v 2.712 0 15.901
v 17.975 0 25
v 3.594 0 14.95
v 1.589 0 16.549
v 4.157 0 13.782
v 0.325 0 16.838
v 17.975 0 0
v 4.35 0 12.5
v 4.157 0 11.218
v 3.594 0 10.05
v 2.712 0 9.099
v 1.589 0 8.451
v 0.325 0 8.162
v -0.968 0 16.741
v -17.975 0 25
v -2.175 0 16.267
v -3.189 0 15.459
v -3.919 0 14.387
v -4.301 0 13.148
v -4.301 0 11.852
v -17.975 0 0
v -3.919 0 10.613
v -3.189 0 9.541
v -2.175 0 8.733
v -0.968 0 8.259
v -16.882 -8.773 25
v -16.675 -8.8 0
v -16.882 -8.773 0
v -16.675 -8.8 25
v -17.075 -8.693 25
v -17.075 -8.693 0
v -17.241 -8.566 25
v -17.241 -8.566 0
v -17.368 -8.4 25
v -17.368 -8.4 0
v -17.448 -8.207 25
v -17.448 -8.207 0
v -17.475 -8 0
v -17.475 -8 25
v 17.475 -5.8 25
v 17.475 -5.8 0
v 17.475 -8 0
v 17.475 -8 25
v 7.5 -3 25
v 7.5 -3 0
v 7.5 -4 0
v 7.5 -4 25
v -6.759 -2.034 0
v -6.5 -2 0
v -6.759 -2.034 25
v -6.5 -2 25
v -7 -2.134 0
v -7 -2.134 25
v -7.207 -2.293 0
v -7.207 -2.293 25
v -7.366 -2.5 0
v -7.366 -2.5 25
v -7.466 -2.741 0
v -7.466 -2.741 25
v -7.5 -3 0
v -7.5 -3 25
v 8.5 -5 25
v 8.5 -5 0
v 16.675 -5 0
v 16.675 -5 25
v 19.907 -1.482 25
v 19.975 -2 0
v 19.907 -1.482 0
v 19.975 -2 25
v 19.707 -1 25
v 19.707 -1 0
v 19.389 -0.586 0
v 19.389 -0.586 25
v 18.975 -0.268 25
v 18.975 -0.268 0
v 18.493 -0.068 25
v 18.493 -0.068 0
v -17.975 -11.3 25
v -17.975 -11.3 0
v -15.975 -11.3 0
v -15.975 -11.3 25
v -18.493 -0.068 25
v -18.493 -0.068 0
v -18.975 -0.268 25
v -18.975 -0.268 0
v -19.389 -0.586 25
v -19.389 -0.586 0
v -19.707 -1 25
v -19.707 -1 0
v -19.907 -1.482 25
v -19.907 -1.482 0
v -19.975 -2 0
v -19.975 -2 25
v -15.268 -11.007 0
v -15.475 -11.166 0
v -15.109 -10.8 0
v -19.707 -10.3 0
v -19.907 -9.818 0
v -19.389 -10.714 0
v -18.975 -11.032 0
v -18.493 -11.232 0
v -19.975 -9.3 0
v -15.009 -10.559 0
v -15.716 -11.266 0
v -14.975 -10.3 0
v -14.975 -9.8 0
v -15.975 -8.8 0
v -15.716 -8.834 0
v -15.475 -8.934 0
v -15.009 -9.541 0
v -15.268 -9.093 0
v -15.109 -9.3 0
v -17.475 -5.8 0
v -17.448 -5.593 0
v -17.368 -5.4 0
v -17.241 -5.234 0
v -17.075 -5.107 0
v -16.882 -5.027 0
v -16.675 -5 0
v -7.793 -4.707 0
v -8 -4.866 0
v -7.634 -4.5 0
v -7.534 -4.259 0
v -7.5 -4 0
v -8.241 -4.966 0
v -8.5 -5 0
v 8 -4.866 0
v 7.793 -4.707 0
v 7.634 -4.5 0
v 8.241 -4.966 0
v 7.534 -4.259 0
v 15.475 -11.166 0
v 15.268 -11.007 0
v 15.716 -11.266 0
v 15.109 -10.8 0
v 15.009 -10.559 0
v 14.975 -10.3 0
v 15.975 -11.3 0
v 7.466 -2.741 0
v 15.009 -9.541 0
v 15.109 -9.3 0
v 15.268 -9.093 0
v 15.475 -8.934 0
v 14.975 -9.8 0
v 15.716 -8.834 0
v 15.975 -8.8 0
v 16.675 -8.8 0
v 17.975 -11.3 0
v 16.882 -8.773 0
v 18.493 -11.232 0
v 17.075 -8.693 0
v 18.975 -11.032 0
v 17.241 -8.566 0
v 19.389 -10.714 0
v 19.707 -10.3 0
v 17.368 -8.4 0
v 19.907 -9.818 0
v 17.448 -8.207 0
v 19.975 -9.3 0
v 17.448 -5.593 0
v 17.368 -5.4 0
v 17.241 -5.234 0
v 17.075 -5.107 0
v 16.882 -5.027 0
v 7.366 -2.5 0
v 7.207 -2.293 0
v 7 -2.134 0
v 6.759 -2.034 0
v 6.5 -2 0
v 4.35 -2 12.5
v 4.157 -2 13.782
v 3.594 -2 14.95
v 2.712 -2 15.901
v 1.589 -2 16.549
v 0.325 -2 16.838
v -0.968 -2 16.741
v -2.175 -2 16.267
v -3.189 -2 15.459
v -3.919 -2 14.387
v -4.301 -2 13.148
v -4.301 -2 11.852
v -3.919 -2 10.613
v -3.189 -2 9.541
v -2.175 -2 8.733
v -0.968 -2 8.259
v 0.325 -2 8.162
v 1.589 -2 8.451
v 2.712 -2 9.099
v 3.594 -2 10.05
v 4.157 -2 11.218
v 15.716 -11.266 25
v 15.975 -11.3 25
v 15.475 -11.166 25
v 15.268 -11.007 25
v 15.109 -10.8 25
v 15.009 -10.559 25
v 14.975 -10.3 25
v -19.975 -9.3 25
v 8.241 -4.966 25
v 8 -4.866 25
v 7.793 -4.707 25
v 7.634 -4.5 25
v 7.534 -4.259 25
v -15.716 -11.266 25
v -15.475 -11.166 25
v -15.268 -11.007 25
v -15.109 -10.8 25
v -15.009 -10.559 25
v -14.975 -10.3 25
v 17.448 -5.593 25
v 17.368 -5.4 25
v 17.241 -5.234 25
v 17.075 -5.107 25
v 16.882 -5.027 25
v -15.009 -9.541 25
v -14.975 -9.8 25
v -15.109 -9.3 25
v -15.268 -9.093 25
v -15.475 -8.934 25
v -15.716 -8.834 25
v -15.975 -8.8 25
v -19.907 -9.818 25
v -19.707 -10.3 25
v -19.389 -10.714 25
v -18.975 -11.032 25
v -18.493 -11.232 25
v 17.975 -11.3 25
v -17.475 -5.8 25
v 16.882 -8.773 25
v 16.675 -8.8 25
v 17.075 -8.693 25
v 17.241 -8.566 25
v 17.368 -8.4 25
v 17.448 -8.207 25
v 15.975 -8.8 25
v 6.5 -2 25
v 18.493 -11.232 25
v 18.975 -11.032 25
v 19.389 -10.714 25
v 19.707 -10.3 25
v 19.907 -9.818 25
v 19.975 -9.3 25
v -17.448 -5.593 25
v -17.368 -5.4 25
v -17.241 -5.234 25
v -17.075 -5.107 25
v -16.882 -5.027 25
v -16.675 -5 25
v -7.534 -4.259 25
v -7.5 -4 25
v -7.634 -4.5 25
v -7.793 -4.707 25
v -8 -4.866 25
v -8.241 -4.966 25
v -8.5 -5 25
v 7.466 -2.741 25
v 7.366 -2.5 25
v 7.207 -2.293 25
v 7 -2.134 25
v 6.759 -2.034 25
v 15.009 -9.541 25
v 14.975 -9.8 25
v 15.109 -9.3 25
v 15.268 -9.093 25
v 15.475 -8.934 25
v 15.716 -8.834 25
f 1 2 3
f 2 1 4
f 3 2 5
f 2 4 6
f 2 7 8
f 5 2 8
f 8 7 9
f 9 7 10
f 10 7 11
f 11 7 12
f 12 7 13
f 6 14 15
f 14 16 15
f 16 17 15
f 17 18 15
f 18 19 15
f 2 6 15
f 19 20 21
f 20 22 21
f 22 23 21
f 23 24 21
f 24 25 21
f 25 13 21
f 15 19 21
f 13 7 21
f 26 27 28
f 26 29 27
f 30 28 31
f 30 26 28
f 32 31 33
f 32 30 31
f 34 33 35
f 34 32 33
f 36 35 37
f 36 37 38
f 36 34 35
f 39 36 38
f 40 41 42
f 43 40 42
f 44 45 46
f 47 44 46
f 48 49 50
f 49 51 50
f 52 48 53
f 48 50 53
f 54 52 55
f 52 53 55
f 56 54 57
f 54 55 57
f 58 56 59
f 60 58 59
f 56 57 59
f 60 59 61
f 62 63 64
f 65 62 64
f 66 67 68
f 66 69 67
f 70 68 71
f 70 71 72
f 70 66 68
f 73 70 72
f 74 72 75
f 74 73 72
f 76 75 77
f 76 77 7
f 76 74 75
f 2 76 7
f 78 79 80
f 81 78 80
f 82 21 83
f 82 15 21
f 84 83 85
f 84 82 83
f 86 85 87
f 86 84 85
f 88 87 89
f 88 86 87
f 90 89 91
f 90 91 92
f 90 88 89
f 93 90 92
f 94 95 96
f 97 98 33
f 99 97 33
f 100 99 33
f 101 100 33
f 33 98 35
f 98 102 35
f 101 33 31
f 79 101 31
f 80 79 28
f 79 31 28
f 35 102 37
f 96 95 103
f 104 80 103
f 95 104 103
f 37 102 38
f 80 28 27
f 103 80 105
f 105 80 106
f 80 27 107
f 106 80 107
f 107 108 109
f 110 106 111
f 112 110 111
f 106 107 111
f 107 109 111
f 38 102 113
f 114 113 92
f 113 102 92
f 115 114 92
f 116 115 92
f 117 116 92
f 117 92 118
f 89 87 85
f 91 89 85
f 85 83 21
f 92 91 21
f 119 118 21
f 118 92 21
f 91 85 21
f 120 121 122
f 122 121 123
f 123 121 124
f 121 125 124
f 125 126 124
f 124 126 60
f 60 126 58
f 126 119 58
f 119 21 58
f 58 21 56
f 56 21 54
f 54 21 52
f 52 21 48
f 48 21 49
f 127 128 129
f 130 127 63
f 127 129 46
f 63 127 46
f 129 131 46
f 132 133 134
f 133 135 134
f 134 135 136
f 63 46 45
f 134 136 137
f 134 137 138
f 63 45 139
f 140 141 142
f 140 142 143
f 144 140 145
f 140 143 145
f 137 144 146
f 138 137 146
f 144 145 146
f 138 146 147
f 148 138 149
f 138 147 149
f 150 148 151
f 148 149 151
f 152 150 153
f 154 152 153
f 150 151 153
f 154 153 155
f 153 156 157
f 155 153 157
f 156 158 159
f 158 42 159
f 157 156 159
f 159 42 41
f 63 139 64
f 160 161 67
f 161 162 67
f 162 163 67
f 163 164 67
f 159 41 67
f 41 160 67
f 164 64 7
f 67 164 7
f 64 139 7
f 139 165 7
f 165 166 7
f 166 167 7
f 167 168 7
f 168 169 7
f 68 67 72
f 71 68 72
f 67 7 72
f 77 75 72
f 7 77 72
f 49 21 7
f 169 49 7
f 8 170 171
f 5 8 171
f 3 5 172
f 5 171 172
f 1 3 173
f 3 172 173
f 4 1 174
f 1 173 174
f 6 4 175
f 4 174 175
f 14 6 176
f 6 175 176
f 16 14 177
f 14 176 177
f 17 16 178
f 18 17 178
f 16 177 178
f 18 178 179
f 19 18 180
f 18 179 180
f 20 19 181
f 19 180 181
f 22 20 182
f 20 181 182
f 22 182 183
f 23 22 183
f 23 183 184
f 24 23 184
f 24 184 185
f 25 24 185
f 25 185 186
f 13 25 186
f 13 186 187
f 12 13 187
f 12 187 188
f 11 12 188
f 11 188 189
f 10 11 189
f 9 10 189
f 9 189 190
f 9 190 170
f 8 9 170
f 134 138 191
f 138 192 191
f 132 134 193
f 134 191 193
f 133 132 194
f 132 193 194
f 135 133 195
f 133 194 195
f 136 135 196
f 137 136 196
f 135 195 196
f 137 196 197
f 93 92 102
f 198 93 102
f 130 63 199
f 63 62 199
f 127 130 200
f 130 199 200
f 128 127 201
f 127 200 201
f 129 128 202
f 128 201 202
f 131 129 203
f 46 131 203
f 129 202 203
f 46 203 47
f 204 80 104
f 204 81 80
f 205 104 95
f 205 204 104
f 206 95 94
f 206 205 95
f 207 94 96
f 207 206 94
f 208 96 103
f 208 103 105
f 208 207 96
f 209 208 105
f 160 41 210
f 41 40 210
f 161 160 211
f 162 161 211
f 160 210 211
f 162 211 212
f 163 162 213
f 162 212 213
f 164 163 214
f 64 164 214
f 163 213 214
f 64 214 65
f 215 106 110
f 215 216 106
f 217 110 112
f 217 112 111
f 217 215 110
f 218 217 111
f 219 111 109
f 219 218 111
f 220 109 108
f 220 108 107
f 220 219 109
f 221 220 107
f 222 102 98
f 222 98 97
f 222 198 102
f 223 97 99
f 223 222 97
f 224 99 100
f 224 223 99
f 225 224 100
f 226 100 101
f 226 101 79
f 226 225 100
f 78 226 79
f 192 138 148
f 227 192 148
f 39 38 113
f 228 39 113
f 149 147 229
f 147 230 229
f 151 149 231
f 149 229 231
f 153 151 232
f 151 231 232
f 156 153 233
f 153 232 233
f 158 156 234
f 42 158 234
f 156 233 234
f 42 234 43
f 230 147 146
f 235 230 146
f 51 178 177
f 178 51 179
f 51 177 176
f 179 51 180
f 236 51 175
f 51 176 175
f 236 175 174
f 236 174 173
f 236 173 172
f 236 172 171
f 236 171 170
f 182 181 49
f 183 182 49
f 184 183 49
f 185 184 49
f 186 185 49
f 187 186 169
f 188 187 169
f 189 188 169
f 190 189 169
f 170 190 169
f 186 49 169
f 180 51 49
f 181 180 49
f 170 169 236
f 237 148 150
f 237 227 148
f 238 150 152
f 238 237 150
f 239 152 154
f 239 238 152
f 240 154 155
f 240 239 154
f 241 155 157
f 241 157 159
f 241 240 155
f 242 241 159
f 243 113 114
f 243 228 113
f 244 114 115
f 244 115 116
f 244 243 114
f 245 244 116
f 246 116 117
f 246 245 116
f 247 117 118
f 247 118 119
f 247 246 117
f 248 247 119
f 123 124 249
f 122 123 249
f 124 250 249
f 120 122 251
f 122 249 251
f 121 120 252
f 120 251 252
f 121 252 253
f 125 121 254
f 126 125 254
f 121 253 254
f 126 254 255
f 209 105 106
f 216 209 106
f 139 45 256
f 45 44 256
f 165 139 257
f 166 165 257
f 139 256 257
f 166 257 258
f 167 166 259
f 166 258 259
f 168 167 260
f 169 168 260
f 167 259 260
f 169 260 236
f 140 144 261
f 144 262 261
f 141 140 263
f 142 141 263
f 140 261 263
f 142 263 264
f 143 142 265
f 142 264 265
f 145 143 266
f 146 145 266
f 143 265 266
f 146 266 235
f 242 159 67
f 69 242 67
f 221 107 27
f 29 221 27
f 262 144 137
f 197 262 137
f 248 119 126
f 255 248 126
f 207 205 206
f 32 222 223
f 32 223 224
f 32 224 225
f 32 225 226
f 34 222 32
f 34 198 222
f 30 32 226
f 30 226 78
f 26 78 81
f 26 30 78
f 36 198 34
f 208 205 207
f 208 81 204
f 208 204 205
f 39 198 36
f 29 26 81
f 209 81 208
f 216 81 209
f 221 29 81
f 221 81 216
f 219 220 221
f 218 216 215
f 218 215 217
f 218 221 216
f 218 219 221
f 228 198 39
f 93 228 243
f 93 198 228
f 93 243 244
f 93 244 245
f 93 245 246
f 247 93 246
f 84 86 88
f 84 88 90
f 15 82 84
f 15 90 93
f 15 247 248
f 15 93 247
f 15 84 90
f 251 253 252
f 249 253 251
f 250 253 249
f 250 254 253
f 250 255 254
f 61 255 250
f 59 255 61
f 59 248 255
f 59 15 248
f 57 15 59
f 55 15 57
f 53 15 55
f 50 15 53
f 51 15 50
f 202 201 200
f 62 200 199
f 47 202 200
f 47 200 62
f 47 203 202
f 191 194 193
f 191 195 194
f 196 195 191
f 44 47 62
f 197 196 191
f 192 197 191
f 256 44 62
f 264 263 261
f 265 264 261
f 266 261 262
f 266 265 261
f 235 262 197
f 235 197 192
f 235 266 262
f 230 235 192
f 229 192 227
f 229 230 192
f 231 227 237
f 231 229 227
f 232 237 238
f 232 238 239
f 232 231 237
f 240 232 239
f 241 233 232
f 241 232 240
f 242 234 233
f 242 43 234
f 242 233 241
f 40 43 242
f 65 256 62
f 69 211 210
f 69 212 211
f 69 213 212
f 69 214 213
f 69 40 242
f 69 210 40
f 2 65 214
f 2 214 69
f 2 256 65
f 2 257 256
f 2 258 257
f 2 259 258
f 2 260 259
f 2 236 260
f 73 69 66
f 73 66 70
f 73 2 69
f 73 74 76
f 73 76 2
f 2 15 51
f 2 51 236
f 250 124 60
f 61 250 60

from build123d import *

# Parameters (mm, degrees)
F1_DEPTH = 25
F2_R     = 2
F3_R     = 1
F4_R     = 0.8
F5_R     = 4.35
F6_DEPTH = 25


with BuildPart() as f1:
    # F0 (on Top) → F1 (new body)
    with BuildSketch(Plane.XY):
        Polygon((-14.975, -11.3), (-14.975, -8.8), (-17.475, -8.8), (-17.475, -5), (-7.5, -5), (-7.5, -2), (0, -2), (7.5, -2), (7.5, -5), (17.475, -5), (17.475, -8.8), (14.975, -8.8), (14.975, -11.3), (19.975, -11.3), (19.975, 0), (0, 0), (-19.975, 0), (-19.975, -11.3), align=None)
    extrude(amount=F1_DEPTH)

    # F2
    f2_edges = [f1.edges().sort_by_distance(p)[0] for p in [
        (-19.975, 0, 12.5),
        (19.975, 0, 12.5),
        (-19.975, -11.3, 12.5),
        (19.975, -11.3, 12.5),
    ]]
    fillet(f2_edges, radius=F2_R)

    # F3
    f3_edges = [f1.edges().sort_by_distance(p)[0] for p in [
        (7.5, -2, 12.5),
        (-7.5, -2, 12.5),
        (7.5, -5, 12.5),
        (-7.5, -5, 12.5),
        (-14.975, -11.3, 12.5),
        (-14.975, -8.8, 12.5),
        (14.975, -8.8, 12.5),
        (14.975, -11.3, 12.5),
    ]]
    fillet(f3_edges, radius=F3_R)

    # F4
    f4_edges = [f1.edges().sort_by_distance(p)[0] for p in [
        (17.475, -5, 12.5),
        (-17.475, -5, 12.5),
        (-17.475, -8.8, 12.5),
        (17.475, -8.8, 12.5),
    ]]
    fillet(f4_edges, radius=F4_R)

    # F5 (on face) → F6 (cut)
    with BuildSketch(Plane.XZ.offset(2)):
        with Locations((0, 12.5)):
            Circle(F5_R)
    extrude(amount=-F6_DEPTH, mode=Mode.SUBTRACT)


solid = f1.part
